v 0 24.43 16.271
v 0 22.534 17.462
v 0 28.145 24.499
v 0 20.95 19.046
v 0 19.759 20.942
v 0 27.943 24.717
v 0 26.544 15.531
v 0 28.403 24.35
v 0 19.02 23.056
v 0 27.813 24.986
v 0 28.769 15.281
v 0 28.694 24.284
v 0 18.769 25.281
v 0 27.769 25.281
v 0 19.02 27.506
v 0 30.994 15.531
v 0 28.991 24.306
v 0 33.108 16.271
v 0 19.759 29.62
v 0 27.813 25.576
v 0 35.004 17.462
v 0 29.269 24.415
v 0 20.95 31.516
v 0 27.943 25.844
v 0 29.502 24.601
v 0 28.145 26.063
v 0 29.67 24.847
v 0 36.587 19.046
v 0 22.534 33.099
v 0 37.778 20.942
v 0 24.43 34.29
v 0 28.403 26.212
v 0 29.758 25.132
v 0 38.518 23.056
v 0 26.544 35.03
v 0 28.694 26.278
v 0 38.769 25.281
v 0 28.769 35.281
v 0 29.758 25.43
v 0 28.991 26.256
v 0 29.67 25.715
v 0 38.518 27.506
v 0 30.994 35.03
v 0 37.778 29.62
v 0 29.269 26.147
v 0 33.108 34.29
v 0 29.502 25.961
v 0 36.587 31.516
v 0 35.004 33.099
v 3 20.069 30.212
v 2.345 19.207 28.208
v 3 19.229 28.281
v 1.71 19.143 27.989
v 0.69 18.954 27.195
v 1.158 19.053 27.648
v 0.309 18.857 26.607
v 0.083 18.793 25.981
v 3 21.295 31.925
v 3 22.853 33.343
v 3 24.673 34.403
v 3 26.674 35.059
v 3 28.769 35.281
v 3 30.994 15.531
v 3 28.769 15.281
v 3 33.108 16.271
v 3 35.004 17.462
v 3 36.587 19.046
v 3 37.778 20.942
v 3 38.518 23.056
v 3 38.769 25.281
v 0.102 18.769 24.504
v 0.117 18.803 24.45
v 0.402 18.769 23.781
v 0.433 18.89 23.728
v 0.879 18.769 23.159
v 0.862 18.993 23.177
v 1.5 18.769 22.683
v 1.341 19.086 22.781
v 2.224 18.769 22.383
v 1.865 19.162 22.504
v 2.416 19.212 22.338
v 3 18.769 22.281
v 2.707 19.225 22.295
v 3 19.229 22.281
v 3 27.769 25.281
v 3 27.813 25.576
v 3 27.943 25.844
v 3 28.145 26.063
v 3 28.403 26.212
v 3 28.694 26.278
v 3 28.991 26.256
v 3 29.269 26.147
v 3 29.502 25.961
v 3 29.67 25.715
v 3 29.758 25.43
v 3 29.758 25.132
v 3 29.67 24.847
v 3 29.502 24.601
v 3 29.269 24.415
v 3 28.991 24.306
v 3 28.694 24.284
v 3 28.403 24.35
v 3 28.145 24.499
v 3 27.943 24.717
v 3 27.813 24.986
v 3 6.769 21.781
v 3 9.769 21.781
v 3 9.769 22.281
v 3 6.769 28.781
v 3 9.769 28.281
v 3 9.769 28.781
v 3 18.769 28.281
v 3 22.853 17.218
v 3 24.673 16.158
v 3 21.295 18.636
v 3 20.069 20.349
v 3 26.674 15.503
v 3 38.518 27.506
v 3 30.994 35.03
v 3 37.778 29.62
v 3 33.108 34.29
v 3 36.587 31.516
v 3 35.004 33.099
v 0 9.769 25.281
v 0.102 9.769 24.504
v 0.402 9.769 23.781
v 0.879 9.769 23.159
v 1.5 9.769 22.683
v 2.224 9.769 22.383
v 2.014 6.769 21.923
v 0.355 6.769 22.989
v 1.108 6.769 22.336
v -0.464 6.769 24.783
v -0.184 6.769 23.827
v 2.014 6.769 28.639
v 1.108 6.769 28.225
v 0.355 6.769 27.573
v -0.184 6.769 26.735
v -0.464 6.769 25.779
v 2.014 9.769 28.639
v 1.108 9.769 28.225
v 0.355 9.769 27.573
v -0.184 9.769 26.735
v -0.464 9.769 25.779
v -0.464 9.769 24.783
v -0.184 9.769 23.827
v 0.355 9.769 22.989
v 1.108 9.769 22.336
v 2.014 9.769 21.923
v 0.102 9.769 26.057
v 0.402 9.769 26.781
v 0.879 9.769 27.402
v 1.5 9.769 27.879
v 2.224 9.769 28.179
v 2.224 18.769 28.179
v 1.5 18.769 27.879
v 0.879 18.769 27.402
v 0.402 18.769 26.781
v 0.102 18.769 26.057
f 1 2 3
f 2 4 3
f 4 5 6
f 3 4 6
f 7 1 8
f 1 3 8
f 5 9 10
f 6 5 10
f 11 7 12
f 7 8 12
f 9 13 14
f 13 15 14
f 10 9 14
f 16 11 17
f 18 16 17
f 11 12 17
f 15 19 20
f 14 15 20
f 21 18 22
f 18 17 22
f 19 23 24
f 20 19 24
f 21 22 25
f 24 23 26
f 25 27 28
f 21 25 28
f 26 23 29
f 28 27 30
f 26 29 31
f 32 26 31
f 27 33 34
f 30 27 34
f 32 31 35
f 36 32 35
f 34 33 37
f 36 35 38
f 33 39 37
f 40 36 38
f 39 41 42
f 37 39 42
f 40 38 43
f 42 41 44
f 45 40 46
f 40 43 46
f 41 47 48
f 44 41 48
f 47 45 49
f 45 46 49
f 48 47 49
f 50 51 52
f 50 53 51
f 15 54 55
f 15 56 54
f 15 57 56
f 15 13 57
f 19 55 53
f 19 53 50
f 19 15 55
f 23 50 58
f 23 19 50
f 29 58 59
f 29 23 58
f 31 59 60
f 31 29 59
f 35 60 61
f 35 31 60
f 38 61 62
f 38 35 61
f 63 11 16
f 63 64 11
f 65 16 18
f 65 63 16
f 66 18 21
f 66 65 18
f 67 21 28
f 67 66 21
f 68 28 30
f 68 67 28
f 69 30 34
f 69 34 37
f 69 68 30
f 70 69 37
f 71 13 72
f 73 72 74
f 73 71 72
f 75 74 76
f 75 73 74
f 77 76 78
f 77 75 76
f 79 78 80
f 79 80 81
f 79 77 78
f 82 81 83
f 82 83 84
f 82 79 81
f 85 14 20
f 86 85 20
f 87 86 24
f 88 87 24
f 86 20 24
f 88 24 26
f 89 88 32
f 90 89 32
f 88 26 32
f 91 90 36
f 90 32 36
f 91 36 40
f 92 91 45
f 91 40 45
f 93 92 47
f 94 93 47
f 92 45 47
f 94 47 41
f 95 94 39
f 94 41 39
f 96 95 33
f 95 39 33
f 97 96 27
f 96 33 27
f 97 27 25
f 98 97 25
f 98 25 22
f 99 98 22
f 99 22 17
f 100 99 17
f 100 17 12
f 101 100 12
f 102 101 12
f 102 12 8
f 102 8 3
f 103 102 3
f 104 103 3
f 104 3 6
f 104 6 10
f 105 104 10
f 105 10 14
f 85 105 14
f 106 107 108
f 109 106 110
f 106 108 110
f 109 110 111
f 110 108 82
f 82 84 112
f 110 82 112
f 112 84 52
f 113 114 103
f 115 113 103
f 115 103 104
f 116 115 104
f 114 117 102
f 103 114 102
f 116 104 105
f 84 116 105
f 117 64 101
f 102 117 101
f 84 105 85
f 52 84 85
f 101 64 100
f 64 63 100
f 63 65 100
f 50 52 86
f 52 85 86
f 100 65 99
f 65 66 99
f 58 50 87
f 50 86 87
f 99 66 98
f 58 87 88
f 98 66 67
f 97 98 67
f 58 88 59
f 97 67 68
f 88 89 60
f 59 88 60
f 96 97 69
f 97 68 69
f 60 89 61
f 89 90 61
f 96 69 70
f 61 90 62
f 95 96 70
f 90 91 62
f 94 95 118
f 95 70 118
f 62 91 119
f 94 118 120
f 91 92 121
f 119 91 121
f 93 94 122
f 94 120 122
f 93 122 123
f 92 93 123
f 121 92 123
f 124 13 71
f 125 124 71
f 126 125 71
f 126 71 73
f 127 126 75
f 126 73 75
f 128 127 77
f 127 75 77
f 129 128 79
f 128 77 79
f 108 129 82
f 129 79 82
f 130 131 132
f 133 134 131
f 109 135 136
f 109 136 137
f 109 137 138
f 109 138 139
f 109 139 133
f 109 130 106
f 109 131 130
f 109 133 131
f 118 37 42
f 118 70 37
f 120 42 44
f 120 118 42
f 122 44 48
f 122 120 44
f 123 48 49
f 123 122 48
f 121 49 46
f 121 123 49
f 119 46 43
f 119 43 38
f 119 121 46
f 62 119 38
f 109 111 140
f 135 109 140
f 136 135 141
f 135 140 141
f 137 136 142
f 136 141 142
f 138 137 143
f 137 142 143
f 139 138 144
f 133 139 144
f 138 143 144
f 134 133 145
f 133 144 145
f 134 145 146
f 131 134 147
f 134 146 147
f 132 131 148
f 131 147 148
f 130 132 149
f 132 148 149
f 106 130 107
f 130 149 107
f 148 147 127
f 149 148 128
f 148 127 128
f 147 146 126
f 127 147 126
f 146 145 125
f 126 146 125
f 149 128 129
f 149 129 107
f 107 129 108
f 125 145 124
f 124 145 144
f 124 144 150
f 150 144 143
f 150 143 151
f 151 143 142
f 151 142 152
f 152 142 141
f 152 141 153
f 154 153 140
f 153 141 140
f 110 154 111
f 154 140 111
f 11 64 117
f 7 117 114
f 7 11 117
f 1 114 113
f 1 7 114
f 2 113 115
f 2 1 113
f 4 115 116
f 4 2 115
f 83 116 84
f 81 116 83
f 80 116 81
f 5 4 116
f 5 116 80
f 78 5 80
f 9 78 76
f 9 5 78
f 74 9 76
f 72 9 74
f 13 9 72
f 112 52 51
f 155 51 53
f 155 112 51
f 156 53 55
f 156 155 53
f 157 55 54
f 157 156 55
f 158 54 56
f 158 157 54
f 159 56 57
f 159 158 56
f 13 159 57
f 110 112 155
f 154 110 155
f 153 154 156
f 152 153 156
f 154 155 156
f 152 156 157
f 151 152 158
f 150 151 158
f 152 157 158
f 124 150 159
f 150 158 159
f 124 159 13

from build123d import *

# Parameters (mm, degrees)
F0_W         = 20
F0_H         = 20
F1_DEPTH     = 3
F3_DEPTH     = 9
F4_R         = 9.99999
F5_T3_DEPTH  = 53
F5_S4_R      = 3
F5_T5_DEPTH  = 29
F5_T8_DEPTH  = 53
F5_S9_R      = 3
F5_T10_DEPTH = 29
F6_R         = 1
F7_DEPTH     = 25
F9_DEPTH     = 3


# Not quite as in the source:
# - a fillet or chamfer that OpenCascade refuses, or shapes differently, is made with other operations: its cross-section is extruded or revolved along the edge and cut away or added
# - a fillet or chamfer is up to 0.001 mm smaller than in the source, because OpenCascade refuses the exact size


with BuildPart() as f1:
    # F0 (on Right) → F1 (new body)
    with BuildSketch(Plane.YZ):
        with Locations((28.7687871605, 25.2807487535)):
            Rectangle(F0_W, F0_H)
    extrude(amount=F1_DEPTH)

    # F2 (on face) → F3 (join)
    with BuildSketch(Plane.XZ.offset(-18.7687871605)):
        with BuildLine():
            Line((3, 22.2807487535), (3, 28.2807487535))
            ThreePointArc((3, 28.2807487535), (0.8786796564, 27.4020690971), (0, 25.2807487535))
            ThreePointArc((0, 25.2807487535), (0.8786796564, 23.15942841), (3, 22.2807487535))
        make_face()
    extrude(amount=F3_DEPTH)

    # F4 (radius 10 in the source; OpenCascade refuses exactly that, so slightly less here)
    f4_edges = [f1.edges().sort_by_distance(p)[0] for p in [
        (1.5, 38.768787, 35.280749),
        (1.5, 38.768787, 15.280749),
    ]]
    fillet(f4_edges, radius=F4_R)

    # F5: fillet of radius 10 on 2 edges, made by hand


with BuildPart() as f5_tool1:
    # F5_s2 → F5_t3 (new body)
    with BuildSketch(Plane.YZ.offset(-25)):
        with BuildLine():
            ThreePointArc((18.7687871605, 25.2807487535), (21.6977193487, 32.3518165654), (28.7687871605, 35.2807487535))
            Line((28.7687871605, 35.2807487535), (18.7687871605, 35.2807487535))
            Line((18.7687871605, 35.2807487535), (18.7687871605, 25.2807487535))
        make_face()
    extrude(amount=F5_T3_DEPTH)

    # F5_s4 → F5_t5 (cut, symmetric)
    with BuildSketch(Plane.XZ.offset(-23.8)):
        with Locations((3, 25.2807487535)):
            Circle(F5_S4_R)
    extrude(amount=F5_T5_DEPTH, both=True, mode=Mode.SUBTRACT)


with BuildPart() as f5_tool6:
    # F5_s7 → F5_t8 (new body)
    with BuildSketch(Plane.YZ.offset(-25)):
        with BuildLine():
            ThreePointArc((28.7687871605, 15.2807487535), (21.6977193487, 18.2096809417), (18.7687871605, 25.2807487535))
            Line((18.7687871605, 25.2807487535), (18.7687871605, 15.2807487535))
            Line((18.7687871605, 15.2807487535), (28.7687871605, 15.2807487535))
        make_face()
    extrude(amount=F5_T8_DEPTH)

    # F5_s9 → F5_t10 (cut, symmetric)
    with BuildSketch(Plane.XZ.offset(-23.8)):
        with Locations((3, 25.2807487535)):
            Circle(F5_S9_R)
    extrude(amount=F5_T10_DEPTH, both=True, mode=Mode.SUBTRACT)


with BuildPart() as f1_1:
    add(f1.part)

    # F5_t11: cut F5_tool1, F5_tool6
    add([f5_tool1.part, f5_tool6.part], mode=Mode.SUBTRACT)

    # F6 (on face) → F7 (cut)
    with BuildSketch(Plane(origin=(0, 0, 0), x_dir=(0, -1, 0), z_dir=(-1, 0, 0))):
        with Locations((-28.7687871605, 25.2807487535)):
            Circle(F6_R)
    extrude(amount=-F7_DEPTH, mode=Mode.SUBTRACT)

    # F8 (on face) → F9 (join)
    with BuildSketch(Plane.XZ.offset(-9.7687871605)):
        with BuildLine():
            Line((3, 28.2807487535), (3, 28.7807487535))
            ThreePointArc((3, 28.7807487535), (-0.5, 25.2807487535), (3, 21.7807487535))
            Line((3, 21.7807487535), (3, 22.2807487535))
            ThreePointArc((3, 22.2807487535), (0, 25.2807487535), (3, 28.2807487535))
        make_face()
        with BuildLine():
            Line((3, 22.2807487535), (3, 28.2807487535))
            ThreePointArc((3, 28.2807487535), (0, 25.2807487535), (3, 22.2807487535))
        make_face()
    extrude(amount=F9_DEPTH)


solid = f1_1.part
